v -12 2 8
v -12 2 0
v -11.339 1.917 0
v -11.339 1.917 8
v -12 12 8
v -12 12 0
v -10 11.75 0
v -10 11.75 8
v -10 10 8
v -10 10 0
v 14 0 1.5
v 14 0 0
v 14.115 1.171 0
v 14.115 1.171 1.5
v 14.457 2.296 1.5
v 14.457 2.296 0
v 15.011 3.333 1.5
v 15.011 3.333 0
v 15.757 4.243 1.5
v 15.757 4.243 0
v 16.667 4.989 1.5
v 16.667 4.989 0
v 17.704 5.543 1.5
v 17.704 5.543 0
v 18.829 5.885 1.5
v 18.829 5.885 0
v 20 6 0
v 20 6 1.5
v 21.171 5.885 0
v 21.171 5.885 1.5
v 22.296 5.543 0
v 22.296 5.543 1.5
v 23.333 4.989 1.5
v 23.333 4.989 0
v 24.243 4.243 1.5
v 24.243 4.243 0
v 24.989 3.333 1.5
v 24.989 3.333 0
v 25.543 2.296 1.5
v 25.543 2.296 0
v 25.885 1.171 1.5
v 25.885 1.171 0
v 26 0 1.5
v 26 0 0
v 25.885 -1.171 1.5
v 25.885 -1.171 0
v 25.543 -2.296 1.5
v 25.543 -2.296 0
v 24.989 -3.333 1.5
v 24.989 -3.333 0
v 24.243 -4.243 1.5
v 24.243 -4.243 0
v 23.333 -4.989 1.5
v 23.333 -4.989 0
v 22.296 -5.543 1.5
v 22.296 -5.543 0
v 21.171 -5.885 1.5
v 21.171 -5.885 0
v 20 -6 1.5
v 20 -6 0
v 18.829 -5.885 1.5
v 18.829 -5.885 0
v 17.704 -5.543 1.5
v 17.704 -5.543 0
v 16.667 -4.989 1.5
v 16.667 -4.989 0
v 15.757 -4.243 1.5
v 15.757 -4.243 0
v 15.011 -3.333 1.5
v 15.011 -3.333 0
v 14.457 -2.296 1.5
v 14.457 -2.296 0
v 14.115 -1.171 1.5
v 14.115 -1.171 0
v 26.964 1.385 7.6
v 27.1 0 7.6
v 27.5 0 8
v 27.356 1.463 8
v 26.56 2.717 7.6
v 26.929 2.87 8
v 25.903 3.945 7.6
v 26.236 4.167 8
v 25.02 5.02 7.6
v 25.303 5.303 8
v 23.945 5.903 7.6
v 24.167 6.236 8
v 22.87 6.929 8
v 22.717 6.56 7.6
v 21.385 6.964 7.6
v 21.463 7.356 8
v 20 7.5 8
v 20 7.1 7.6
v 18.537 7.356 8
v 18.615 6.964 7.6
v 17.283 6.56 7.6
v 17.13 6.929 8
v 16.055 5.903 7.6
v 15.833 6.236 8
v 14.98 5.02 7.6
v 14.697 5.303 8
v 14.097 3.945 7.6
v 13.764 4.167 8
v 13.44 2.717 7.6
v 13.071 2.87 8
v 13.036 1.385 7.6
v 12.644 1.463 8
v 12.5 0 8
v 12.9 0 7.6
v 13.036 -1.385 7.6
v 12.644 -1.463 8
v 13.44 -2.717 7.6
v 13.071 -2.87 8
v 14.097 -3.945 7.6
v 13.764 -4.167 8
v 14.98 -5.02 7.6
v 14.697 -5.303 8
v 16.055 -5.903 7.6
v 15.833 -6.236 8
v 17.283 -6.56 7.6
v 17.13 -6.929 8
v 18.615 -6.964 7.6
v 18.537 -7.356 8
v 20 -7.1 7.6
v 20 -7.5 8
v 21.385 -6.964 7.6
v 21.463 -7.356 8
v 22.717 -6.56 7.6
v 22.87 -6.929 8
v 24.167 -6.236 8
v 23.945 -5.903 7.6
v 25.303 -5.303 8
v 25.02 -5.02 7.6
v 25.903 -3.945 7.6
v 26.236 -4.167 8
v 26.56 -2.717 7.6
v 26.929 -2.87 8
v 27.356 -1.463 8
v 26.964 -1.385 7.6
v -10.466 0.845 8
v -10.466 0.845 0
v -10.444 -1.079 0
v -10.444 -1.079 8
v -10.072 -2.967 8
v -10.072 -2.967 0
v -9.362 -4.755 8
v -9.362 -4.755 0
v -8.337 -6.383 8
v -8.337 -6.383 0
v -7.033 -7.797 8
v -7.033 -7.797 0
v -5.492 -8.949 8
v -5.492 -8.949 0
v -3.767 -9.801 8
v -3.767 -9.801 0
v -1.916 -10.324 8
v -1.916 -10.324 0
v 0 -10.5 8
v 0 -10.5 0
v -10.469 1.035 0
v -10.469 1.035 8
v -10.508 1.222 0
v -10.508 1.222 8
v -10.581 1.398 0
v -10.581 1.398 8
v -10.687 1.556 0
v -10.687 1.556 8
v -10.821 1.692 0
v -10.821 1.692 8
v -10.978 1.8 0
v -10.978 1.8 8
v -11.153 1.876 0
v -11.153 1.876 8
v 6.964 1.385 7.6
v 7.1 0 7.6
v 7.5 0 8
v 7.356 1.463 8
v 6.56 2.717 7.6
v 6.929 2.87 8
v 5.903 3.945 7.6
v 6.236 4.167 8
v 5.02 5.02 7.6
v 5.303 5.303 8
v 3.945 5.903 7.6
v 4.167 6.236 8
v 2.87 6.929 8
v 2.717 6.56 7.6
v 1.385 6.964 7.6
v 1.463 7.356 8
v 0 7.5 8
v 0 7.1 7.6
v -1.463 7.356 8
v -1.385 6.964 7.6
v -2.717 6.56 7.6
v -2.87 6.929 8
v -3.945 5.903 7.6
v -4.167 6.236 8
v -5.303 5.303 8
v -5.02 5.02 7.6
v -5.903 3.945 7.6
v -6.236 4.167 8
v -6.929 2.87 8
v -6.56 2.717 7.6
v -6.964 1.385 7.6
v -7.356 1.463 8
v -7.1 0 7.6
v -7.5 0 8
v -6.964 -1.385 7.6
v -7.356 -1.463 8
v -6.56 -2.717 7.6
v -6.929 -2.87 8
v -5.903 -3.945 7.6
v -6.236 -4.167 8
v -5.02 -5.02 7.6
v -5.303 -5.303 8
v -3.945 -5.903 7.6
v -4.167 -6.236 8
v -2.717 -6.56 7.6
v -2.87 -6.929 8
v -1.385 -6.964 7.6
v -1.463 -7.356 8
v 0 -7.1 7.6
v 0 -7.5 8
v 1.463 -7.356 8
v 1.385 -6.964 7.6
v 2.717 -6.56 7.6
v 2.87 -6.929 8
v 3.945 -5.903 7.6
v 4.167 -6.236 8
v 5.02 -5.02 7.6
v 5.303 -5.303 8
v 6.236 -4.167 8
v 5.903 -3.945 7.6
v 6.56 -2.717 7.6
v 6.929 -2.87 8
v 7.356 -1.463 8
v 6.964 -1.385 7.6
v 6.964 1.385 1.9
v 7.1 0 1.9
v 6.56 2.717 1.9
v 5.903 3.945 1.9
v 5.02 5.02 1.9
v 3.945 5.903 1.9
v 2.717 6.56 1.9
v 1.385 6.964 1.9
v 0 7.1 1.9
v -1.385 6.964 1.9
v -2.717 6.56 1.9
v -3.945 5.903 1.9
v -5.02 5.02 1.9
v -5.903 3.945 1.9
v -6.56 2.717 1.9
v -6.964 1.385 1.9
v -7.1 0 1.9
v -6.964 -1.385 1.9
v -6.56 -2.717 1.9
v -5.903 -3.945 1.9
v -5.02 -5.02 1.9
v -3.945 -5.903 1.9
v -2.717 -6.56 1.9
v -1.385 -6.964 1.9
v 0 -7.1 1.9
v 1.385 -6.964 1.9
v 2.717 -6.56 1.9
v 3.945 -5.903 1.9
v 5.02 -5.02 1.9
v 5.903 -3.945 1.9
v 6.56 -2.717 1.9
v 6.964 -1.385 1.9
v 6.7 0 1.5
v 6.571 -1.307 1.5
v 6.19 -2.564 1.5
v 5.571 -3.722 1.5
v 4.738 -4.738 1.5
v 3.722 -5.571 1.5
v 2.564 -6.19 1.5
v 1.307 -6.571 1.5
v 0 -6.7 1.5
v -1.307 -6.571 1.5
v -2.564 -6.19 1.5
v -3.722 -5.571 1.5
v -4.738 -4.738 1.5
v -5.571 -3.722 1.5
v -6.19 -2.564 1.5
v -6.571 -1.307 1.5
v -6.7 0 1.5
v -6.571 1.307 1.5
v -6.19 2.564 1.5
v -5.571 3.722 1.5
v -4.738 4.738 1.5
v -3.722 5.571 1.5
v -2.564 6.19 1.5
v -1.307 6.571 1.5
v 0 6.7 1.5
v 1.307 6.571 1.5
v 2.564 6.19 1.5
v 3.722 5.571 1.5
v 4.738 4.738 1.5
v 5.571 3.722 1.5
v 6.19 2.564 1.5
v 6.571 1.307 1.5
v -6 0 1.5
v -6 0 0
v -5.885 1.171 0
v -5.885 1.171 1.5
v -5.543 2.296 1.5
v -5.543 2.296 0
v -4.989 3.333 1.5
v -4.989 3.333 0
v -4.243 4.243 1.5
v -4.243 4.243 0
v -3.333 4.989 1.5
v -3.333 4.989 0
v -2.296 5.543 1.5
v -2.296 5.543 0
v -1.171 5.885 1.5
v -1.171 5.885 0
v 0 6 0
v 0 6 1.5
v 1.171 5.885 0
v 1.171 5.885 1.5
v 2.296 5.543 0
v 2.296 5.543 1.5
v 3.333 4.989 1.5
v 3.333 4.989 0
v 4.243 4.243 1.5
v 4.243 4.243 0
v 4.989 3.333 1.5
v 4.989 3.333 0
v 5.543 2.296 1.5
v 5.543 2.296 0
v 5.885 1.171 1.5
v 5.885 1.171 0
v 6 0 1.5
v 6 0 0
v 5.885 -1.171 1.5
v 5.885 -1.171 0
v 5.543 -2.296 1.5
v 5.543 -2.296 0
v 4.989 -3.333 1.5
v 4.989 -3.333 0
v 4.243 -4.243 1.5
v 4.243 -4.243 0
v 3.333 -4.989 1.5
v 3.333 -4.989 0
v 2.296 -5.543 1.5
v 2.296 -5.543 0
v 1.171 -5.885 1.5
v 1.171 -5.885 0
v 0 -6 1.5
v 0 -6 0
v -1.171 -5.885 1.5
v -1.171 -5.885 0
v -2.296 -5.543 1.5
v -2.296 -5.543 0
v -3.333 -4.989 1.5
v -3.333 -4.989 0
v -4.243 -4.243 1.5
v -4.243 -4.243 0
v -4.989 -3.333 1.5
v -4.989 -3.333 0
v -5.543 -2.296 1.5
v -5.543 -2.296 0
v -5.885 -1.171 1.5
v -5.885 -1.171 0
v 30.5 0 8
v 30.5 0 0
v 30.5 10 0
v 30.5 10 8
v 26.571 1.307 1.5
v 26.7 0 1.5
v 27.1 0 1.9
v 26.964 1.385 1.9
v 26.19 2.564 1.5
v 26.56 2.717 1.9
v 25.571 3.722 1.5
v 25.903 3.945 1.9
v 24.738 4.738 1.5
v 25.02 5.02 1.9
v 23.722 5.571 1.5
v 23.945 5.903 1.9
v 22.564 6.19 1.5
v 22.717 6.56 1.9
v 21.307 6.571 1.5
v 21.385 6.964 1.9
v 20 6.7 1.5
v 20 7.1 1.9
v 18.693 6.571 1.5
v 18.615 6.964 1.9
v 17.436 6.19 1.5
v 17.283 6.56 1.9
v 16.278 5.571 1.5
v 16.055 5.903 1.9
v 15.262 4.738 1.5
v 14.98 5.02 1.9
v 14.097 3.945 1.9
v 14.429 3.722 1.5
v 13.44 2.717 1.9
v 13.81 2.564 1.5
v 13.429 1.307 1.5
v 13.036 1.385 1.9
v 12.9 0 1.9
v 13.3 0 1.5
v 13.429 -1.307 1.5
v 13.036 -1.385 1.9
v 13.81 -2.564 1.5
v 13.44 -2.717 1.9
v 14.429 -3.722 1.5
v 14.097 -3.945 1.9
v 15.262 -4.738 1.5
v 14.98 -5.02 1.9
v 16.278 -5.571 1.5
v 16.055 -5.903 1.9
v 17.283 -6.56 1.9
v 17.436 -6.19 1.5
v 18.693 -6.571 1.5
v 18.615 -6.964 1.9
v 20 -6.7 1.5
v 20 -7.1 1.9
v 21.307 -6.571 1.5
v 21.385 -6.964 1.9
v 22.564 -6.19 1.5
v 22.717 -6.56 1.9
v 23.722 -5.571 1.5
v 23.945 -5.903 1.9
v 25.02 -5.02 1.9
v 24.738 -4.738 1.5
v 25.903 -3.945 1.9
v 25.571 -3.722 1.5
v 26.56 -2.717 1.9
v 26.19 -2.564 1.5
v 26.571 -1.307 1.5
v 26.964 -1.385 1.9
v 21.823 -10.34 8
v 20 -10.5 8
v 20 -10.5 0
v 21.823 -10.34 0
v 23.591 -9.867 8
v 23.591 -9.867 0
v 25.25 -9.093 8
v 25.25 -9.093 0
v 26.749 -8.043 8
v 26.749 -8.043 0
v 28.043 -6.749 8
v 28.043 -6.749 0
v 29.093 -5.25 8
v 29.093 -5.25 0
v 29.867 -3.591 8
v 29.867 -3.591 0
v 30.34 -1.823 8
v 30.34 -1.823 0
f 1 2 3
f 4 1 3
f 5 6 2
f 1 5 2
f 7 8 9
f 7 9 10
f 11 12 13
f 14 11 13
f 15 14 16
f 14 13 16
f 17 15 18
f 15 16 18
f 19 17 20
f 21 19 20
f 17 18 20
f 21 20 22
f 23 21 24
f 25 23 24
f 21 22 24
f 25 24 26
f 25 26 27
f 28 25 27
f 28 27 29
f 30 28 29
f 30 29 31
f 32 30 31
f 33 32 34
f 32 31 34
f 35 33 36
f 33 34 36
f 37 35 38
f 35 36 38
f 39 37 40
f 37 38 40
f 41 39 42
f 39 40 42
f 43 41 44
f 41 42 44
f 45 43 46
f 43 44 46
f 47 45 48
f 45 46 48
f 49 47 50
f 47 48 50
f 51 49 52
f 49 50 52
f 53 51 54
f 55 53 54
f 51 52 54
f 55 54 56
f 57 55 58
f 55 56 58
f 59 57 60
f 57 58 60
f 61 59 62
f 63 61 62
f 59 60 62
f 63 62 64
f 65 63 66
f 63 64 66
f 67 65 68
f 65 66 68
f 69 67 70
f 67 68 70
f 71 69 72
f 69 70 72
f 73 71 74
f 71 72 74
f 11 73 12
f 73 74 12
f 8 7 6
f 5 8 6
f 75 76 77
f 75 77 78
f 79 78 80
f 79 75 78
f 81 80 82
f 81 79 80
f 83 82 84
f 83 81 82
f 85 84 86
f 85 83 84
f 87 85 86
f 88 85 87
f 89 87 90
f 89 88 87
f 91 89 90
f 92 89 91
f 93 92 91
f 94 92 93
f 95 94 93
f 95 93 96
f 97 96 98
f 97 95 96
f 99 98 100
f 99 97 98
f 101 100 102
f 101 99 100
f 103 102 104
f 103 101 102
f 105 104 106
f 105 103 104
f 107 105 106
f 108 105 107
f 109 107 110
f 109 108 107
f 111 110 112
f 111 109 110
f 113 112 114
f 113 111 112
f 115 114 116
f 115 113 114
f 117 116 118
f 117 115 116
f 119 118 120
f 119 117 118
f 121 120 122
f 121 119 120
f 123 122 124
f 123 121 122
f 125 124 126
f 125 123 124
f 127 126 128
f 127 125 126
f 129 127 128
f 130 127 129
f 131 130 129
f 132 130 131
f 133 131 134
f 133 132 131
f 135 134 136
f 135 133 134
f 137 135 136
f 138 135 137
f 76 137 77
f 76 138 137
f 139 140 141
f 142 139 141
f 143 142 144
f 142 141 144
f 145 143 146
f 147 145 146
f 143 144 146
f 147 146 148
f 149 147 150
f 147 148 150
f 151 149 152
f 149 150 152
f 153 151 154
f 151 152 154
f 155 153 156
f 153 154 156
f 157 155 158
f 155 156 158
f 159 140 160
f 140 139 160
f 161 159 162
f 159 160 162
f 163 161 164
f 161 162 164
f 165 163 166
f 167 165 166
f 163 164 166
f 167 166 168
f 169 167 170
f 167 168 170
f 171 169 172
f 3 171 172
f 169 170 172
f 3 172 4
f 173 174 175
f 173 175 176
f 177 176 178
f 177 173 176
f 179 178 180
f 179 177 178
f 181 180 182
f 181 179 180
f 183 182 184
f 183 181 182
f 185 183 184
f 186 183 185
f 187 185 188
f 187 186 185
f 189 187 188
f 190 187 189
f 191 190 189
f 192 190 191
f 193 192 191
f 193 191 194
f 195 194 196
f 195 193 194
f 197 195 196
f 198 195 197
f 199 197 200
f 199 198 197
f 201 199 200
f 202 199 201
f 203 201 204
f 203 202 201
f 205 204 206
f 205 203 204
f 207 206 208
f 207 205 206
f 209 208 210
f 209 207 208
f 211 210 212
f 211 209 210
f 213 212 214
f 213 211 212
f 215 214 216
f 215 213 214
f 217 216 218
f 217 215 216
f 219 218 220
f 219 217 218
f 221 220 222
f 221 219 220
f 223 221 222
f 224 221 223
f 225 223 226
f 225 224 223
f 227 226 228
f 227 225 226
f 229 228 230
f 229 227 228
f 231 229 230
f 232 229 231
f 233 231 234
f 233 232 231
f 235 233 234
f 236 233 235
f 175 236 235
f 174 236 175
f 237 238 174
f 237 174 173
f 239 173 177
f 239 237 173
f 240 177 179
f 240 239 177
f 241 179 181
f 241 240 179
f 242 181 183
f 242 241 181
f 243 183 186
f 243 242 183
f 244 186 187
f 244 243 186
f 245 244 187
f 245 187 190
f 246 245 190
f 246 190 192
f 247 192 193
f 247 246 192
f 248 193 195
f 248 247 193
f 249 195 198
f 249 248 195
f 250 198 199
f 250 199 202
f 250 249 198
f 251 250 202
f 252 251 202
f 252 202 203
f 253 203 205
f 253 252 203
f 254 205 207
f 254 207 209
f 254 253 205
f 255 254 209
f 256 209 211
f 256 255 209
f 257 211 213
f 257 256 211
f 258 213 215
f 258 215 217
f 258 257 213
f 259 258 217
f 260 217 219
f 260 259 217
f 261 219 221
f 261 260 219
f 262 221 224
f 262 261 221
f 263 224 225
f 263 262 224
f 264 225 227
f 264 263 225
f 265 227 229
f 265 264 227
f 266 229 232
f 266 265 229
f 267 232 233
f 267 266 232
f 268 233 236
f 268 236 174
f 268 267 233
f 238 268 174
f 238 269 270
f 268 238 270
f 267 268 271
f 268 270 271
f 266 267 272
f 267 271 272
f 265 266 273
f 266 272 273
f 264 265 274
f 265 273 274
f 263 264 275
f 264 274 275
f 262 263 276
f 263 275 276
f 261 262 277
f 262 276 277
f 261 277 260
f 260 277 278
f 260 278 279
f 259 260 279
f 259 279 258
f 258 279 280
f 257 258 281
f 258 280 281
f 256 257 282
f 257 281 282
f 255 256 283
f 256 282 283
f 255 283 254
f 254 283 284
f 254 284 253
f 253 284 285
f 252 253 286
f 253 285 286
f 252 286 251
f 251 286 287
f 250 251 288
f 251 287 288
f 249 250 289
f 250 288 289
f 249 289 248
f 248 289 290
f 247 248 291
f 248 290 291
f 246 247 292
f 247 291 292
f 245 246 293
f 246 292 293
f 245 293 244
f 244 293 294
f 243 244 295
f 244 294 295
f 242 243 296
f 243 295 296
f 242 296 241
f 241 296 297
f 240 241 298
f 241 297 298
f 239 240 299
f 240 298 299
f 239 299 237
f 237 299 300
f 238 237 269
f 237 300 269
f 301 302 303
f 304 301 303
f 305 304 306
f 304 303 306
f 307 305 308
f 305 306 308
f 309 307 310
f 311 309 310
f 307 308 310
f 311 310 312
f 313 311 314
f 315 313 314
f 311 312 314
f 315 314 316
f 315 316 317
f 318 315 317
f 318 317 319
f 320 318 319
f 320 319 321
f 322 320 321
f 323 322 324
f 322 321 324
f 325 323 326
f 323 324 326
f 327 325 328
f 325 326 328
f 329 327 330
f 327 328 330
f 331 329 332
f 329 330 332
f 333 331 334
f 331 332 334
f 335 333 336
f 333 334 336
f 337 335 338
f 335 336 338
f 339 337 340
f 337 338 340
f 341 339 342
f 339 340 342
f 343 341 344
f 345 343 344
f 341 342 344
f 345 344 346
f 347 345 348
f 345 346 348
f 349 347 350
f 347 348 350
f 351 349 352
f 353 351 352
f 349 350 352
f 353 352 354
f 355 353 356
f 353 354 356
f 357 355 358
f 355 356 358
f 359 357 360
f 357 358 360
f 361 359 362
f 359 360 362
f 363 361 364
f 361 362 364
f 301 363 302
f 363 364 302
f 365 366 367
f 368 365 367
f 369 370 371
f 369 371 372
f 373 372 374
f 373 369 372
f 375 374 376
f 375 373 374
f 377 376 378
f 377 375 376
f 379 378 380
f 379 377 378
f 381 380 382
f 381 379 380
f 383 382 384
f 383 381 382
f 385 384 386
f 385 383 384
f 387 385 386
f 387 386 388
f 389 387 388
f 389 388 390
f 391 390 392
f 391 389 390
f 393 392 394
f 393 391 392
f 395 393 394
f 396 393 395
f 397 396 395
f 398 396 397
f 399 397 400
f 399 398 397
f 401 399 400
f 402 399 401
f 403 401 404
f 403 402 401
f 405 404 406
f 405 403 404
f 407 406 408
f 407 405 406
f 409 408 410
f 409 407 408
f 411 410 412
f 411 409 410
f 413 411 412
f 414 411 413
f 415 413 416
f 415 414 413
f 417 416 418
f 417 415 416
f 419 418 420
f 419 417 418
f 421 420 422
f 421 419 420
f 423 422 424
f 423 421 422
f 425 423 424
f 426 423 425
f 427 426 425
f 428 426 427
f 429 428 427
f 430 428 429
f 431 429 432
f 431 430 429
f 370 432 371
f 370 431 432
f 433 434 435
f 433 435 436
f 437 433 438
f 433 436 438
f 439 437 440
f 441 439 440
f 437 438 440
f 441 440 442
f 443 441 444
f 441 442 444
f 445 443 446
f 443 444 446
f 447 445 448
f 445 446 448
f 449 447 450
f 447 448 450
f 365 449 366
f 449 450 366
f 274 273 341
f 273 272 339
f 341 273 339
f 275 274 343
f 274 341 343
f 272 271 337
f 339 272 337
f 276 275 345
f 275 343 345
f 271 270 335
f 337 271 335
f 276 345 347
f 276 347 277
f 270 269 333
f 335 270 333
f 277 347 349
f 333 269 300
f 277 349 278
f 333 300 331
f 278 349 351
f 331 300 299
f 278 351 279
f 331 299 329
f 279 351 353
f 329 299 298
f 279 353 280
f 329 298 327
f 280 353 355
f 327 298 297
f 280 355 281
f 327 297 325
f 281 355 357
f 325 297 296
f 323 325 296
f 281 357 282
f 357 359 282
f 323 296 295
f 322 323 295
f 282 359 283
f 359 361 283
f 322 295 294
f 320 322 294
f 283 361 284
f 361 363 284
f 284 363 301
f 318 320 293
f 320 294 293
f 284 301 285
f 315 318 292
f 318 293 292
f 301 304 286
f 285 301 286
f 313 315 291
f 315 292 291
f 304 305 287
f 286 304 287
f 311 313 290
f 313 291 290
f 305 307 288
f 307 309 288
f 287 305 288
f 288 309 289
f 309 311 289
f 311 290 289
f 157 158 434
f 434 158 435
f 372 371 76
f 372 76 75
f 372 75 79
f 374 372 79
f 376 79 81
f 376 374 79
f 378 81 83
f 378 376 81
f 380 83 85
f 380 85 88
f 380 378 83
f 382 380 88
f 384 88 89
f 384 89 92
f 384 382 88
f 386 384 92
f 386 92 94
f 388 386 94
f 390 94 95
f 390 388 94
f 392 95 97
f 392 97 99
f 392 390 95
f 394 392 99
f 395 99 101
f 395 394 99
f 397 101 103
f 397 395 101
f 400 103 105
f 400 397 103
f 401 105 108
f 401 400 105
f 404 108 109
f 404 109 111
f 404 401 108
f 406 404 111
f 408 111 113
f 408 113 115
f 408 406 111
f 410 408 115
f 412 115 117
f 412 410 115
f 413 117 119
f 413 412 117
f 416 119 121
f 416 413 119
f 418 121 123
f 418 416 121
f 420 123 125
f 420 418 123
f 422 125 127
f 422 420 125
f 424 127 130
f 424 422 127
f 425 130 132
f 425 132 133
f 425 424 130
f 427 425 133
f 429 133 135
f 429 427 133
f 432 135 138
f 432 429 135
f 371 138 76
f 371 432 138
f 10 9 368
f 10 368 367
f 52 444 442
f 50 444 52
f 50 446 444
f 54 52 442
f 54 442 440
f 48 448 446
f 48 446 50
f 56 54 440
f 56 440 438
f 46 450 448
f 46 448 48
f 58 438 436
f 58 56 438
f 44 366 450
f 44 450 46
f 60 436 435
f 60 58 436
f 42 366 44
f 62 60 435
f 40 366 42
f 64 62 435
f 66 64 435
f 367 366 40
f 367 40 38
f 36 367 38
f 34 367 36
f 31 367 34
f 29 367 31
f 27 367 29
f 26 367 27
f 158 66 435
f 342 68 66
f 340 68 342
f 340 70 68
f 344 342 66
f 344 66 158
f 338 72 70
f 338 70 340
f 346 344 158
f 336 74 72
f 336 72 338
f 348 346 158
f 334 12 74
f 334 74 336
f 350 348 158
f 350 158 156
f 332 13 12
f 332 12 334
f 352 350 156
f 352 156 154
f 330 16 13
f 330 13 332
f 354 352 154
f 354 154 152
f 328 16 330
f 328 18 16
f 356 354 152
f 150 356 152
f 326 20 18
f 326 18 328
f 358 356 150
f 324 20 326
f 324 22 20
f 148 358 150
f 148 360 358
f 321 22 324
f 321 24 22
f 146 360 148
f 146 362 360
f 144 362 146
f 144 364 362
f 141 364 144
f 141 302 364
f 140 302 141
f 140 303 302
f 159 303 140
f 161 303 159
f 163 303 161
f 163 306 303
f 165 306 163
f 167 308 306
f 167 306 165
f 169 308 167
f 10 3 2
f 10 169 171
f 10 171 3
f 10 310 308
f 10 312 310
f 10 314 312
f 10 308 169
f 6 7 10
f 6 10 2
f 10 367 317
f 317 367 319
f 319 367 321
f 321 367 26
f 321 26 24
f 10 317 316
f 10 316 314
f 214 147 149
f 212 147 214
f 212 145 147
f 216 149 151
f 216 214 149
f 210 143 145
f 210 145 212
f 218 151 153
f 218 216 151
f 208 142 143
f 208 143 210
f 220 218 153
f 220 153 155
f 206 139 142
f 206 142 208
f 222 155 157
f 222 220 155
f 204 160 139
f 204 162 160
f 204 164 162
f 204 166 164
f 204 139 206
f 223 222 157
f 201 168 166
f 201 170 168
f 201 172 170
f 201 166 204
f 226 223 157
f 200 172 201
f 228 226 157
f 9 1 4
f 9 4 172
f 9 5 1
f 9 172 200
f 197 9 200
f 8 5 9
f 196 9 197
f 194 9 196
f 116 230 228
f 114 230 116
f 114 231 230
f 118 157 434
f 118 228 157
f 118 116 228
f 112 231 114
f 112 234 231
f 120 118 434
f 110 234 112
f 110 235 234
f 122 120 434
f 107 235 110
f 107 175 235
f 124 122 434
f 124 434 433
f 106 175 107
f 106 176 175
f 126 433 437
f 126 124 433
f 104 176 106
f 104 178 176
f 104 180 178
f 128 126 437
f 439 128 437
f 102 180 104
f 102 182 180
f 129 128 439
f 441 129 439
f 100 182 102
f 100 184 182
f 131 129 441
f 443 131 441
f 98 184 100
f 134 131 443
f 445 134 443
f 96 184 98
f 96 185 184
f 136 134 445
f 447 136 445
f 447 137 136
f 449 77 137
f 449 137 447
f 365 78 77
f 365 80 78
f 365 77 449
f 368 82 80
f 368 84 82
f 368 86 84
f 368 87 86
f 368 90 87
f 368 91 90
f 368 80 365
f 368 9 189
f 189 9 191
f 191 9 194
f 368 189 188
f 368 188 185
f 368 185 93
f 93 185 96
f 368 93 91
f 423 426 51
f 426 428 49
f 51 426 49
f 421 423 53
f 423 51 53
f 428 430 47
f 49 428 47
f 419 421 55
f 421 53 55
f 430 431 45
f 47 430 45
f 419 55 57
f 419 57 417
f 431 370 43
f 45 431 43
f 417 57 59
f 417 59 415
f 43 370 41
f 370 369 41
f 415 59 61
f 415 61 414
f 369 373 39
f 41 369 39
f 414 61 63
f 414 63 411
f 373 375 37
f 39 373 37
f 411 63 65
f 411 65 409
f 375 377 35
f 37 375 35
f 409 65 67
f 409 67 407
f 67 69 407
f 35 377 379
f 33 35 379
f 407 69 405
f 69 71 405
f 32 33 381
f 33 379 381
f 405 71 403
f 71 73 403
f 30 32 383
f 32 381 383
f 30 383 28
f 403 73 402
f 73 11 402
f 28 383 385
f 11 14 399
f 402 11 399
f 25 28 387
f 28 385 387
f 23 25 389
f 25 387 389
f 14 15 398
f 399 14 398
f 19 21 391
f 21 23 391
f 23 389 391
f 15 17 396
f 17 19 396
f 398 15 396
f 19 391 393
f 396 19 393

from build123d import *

# Parameters (mm, degrees)
SKETCH1_R               = 7.1
BOSS_EXTRUDE1_DEPTH     = 8
SKETCH2_R               = 7.1
SKETCH2_R_2             = 6
BOSS_EXTRUDE2_DEPTH     = 1.5
SKETCH3_W               = 10
SKETCH3_H               = 10
CUT_EXTRUDE1_DEPTH      = 31.5
CUT_EXTRUDE1_DEPTH_BACK = 10
FILLET4_R               = 1
CHAMFER1_SIZE           = 0.4


with BuildPart() as part:
    # Sketch1 → Boss-Extrude1 (new body)
    with BuildSketch(Plane.XY):
        with BuildLine():
            Line((-12, 2), (-10.345741649, 1.793217706))
            ThreePointArc((-10.345741649, 1.793217706), (-8.033641326, -6.760961991), (0, -10.5))
            Line((0, -10.5), (20, -10.5))
            ThreePointArc((20, -10.5), (27.424621202, -7.424621202), (30.5, 0))
            Line((30.5, 0), (30.5, 10.5))
            Line((30.5, 10.5), (0, 10.5))
            Line((0, 10.5), (-12, 12))
            Line((-12, 12), (-12, 2))
        make_face()
        with Locations((20, 0)):
            Circle(SKETCH1_R, mode=Mode.SUBTRACT)
        Circle(SKETCH1_R, mode=Mode.SUBTRACT)
    extrude(amount=BOSS_EXTRUDE1_DEPTH)

    # Sketch2 → Boss-Extrude2 (add)
    with BuildSketch(Plane(origin=(0, 0, 0), x_dir=(-1, 0, 0), z_dir=(0, 0, -1))):
        with Locations((-20, 0)):
            Circle(SKETCH2_R)
        with Locations((-20, 0)):
            Circle(SKETCH2_R_2, mode=Mode.SUBTRACT)
        Circle(SKETCH2_R)
        Circle(SKETCH2_R_2, mode=Mode.SUBTRACT)
    extrude(amount=-BOSS_EXTRUDE2_DEPTH)

    # Sketch3 → Cut-Extrude1 (cut, two sides)
    with BuildSketch(Plane(origin=(0, 0, 0), x_dir=(0, 0, -1), z_dir=(1, 0, 0))) as cut_extrude1_sk:
        with Locations((-4, 15)):
            Rectangle(SKETCH3_W, SKETCH3_H)
    extrude(amount=CUT_EXTRUDE1_DEPTH, mode=Mode.SUBTRACT)
    extrude(cut_extrude1_sk.sketch, amount=-CUT_EXTRUDE1_DEPTH_BACK, mode=Mode.SUBTRACT)

    # Fillet4
    fillet4_edges = [part.edges().sort_by_distance(p)[0] for p in [
        (-10.345741649, 1.793217706, 4),
    ]]
    fillet(fillet4_edges, radius=FILLET4_R)

    # Chamfer1
    chamfer1_edges = [part.edges().sort_by_distance(p)[0] for p in [
        (12.9, 0, 1.5),
        (-7.1, 0, 1.5),
        (12.9, 0, 8),
        (-7.1, 0, 8),
    ]]
    chamfer(chamfer1_edges, length=CHAMFER1_SIZE)


solid = part.part
